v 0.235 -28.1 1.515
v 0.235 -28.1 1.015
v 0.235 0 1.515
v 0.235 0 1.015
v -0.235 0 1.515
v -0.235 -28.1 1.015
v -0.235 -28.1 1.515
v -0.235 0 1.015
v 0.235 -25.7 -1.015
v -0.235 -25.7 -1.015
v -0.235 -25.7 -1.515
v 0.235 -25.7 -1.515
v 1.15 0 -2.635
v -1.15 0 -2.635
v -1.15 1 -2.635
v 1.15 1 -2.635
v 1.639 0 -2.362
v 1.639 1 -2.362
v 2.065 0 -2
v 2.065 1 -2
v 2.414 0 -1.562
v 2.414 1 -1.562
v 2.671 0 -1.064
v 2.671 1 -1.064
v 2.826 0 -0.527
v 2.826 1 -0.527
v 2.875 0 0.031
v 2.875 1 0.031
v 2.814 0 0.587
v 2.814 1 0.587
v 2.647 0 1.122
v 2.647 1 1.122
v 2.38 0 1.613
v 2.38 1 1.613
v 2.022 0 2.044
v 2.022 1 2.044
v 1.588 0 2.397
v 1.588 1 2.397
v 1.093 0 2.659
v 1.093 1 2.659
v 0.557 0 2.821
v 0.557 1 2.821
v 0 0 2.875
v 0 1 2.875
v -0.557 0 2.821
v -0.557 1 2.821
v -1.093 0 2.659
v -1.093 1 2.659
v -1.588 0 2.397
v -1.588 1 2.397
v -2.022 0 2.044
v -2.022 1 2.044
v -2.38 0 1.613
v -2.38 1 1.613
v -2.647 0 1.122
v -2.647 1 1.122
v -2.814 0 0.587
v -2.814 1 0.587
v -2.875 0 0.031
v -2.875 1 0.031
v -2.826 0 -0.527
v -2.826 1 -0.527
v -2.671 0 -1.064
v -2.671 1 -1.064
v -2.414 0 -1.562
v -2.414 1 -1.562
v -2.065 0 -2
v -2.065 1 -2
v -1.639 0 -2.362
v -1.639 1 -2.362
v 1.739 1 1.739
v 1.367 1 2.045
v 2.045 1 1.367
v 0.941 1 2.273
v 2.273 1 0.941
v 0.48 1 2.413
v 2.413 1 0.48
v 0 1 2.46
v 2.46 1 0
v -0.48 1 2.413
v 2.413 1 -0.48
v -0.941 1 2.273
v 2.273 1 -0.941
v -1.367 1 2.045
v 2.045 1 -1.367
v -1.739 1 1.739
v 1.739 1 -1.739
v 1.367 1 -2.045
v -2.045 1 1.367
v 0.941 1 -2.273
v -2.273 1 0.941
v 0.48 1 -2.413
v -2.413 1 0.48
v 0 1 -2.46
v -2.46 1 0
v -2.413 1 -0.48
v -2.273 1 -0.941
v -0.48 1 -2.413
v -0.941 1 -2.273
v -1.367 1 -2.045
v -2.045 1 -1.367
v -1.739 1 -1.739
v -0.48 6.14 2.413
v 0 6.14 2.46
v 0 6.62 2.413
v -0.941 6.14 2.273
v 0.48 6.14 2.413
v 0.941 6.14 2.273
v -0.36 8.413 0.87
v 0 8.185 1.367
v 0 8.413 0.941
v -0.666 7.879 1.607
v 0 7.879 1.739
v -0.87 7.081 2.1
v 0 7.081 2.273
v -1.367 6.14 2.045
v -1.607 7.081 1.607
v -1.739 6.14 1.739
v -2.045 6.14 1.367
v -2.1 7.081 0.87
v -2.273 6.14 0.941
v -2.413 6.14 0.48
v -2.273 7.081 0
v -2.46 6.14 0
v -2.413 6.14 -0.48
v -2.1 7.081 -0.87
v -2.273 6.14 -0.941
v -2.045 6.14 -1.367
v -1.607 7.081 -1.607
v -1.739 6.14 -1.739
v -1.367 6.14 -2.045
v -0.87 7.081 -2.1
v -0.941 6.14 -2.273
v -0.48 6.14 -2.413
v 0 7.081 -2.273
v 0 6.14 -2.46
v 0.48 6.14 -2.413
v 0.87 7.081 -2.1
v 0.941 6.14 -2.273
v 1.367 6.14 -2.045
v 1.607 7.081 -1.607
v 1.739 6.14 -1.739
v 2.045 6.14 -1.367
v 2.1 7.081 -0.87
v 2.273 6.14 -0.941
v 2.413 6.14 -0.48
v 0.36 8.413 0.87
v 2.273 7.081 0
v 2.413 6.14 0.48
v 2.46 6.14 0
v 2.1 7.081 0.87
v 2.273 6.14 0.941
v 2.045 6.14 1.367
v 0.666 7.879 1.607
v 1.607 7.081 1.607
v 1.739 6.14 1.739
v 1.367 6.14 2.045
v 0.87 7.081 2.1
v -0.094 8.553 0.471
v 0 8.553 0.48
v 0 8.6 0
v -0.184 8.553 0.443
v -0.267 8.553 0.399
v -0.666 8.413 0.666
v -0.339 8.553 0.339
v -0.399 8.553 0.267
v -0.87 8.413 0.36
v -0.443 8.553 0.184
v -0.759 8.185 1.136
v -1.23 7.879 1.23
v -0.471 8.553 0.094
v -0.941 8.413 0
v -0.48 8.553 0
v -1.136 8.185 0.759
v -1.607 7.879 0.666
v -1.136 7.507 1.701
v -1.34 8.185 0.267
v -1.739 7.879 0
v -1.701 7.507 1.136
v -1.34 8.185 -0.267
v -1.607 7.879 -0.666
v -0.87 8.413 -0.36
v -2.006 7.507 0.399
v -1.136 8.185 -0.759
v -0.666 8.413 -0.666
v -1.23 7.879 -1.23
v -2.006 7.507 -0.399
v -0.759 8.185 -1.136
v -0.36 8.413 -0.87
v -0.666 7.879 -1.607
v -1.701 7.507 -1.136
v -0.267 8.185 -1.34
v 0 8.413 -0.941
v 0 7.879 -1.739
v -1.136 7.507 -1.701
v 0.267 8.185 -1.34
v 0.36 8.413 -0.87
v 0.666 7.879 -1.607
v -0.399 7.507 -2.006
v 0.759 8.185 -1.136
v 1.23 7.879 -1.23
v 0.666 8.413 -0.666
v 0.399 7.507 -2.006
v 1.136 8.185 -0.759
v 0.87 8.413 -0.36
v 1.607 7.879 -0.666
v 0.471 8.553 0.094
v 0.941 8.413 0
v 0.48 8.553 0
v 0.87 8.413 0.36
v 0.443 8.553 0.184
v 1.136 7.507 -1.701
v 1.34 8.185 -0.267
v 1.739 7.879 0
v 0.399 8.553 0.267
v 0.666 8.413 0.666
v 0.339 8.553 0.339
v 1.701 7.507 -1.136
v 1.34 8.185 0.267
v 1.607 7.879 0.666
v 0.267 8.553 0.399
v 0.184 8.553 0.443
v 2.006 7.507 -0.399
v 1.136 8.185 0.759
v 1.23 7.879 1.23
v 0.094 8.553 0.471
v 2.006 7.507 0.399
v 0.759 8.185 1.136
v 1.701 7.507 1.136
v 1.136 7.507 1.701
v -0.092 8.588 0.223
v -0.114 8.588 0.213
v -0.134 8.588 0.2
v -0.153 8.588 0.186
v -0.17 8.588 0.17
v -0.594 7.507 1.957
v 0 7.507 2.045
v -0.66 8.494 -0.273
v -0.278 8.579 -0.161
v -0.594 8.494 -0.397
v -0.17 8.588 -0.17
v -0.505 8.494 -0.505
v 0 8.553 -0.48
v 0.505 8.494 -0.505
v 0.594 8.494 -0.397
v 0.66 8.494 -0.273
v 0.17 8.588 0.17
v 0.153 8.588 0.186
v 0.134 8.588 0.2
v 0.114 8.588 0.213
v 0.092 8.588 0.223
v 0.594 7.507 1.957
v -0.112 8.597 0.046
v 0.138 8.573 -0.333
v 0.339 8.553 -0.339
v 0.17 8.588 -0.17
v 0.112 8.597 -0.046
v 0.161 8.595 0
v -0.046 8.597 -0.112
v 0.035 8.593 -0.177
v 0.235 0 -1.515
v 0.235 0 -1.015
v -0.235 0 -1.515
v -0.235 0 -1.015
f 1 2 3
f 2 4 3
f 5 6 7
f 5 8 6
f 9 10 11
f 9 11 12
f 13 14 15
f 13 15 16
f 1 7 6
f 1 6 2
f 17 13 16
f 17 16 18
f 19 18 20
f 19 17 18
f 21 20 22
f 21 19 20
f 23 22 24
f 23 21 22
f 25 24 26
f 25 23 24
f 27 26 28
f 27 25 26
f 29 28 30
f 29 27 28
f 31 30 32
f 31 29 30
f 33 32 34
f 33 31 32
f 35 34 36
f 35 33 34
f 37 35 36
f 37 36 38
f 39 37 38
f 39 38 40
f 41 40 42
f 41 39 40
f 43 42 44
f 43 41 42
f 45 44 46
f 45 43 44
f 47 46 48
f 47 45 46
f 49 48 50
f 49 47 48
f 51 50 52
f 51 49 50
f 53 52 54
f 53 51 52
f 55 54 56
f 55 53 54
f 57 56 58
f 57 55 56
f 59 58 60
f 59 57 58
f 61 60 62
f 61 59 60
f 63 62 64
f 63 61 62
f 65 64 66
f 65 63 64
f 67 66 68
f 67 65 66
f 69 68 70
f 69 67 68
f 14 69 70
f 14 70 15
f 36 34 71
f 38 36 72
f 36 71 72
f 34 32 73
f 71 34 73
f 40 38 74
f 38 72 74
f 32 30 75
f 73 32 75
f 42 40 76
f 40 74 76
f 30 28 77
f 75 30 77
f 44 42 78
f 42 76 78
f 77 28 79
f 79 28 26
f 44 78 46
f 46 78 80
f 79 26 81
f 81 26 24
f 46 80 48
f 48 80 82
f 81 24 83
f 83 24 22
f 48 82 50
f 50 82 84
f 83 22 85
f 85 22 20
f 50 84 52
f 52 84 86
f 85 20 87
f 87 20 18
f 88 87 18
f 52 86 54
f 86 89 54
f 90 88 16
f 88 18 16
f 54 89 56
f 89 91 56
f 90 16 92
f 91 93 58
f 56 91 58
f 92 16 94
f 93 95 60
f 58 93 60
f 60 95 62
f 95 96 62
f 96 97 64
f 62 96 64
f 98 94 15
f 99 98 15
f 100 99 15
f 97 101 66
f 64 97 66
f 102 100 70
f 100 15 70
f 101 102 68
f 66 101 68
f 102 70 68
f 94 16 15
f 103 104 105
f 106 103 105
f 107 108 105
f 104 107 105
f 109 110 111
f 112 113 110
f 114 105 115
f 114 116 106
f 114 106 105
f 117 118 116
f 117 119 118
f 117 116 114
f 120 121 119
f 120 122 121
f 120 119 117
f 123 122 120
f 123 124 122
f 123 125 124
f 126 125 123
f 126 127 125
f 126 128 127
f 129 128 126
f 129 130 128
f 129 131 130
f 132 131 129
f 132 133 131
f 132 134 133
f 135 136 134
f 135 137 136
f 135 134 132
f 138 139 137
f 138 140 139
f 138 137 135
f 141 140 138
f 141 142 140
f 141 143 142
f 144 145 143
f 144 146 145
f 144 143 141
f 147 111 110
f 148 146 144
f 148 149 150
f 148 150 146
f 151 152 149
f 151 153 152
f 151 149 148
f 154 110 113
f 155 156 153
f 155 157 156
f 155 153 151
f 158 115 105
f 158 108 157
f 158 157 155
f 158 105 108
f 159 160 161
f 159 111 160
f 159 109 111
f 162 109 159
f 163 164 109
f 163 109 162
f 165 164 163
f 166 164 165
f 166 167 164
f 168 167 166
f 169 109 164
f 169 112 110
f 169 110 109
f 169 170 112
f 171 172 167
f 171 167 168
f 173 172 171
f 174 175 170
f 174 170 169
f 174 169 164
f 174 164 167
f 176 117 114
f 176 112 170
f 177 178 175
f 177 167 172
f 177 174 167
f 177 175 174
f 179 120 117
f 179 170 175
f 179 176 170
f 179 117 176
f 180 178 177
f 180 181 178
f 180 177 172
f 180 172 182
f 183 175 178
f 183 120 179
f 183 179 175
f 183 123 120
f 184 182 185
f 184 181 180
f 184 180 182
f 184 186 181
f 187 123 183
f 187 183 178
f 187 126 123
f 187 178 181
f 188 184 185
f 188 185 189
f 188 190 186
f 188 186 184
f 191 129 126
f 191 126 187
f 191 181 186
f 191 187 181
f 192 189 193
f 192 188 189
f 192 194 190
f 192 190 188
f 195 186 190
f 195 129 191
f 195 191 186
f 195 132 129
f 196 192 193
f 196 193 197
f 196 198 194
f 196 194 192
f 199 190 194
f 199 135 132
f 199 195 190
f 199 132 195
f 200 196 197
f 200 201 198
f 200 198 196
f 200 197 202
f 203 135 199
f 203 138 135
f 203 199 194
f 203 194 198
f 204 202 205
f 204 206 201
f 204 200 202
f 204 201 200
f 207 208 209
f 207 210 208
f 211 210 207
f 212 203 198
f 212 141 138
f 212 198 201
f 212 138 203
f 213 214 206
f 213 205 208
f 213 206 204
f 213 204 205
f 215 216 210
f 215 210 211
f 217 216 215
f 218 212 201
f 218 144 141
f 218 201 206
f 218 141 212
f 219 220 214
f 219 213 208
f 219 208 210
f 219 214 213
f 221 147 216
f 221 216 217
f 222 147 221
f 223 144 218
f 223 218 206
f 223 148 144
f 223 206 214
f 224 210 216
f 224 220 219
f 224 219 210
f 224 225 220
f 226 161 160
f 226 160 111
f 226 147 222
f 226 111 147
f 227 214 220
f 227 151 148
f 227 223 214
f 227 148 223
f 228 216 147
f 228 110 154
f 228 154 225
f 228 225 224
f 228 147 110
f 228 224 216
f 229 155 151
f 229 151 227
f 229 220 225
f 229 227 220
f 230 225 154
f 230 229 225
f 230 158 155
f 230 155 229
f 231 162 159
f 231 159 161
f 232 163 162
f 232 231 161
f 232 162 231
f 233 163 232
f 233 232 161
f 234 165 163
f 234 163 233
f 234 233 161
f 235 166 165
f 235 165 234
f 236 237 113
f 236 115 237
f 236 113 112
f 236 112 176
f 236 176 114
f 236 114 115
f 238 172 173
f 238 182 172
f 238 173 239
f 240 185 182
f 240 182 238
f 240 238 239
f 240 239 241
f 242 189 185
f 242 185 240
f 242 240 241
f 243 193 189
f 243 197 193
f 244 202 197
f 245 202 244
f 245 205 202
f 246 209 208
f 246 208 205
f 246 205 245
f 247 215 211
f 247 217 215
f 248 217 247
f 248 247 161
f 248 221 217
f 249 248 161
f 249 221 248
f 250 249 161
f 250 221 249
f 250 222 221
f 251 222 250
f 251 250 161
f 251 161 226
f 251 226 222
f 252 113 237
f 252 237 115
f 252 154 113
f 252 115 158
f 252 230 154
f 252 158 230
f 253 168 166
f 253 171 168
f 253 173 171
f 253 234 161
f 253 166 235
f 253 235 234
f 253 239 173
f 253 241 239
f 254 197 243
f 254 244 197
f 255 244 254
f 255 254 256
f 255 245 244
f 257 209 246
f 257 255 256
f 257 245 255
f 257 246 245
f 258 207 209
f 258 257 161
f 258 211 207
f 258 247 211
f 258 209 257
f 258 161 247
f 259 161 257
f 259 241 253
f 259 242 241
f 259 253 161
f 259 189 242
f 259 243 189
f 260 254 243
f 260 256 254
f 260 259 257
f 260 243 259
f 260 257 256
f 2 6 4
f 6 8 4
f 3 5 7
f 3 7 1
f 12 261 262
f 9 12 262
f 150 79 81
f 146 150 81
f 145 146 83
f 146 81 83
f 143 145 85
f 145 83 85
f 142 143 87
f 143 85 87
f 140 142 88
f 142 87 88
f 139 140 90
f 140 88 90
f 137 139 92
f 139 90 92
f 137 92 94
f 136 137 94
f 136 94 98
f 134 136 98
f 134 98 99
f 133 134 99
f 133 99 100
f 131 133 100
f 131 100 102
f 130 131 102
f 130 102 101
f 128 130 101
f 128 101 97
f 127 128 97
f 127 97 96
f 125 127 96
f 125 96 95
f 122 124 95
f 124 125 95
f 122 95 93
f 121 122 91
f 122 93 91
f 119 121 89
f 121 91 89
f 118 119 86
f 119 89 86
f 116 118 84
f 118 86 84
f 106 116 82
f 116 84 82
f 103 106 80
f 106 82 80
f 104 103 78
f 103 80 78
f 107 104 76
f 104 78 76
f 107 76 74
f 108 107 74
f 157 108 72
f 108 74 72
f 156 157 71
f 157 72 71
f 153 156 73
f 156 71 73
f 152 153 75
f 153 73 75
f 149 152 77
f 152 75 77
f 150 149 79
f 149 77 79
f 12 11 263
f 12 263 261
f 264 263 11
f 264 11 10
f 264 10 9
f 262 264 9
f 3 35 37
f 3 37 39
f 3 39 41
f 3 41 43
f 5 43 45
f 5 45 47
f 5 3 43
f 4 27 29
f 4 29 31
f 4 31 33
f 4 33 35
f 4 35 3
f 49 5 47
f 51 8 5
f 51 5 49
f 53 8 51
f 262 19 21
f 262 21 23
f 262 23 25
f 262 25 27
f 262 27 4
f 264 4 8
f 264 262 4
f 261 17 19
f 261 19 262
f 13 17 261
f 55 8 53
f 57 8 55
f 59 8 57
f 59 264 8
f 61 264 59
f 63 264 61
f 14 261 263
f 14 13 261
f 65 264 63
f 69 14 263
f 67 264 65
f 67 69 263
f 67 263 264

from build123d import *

# Parameters (mm, degrees)
EXTRUDE_1_DEPTH = 1
SKETCH_2_R      = 2.46
EXTRUDE_2_DEPTH = 7.6
SKETCH_4_W      = 0.47
SKETCH_4_H      = 0.5
EXTRUDE_3_DEPTH = 25.7
SKETCH_5_W      = 0.47
SKETCH_5_H      = 0.5
EXTRUDE_4_DEPTH = 2.4


with BuildPart() as part:
    # 草图1 → 凸台-拉伸1 (new body)
    with BuildSketch(Plane(origin=(0, 0, 0), x_dir=(1, 0, 0), z_dir=(0, 1, 0))):
        with BuildLine():
            Line((-1.149957, 2.635), (1.149957, 2.635))
            ThreePointArc((1.149957, 2.635), (0, -2.875), (-1.149957, 2.635))
        make_face()
    extrude(amount=EXTRUDE_1_DEPTH)

    # 草图2 → 凸台-拉伸2 (add)
    with BuildSketch(Plane(origin=(0, 1, 0), x_dir=(1, 0, 0), z_dir=(0, 1, 0))):
        Circle(SKETCH_2_R)
    extrude(amount=EXTRUDE_2_DEPTH)

    # 草图3 → 切除-旋转1 (revolve, cut)
    with BuildSketch(Plane(origin=(0, 0, 0), x_dir=(0, 0, -1), z_dir=(1, 0, 0))):
        with BuildLine():
            Line((-2.46, 6.14), (-4.608425, 6.14))
            Line((-4.608425, 6.14), (-4.608425, 10.205518))
            Line((-4.608425, 10.205518), (0, 10.205518))
            Line((0, 10.205518), (0, 8.6))
            ThreePointArc((0, 8.6), (-1.739483, 7.879483), (-2.46, 6.14))
        make_face()
    revolve(axis=Axis((0, 10.969013, 0), (0, -1, 0)), mode=Mode.SUBTRACT)

    # 草图4 → 凸台-拉伸3 (add)
    with BuildSketch(Plane.XZ):
        with Locations((0, -1.265)):
            Rectangle(SKETCH_4_W, SKETCH_4_H)
        with Locations((0, 1.265)):
            Rectangle(SKETCH_4_W, SKETCH_4_H)
    extrude(amount=EXTRUDE_3_DEPTH)

    # 草图5 → 凸台-拉伸4 (add)
    with BuildSketch(Plane.XZ.offset(25.7)):
        with Locations((0, 1.265)):
            Rectangle(SKETCH_5_W, SKETCH_5_H)
    extrude(amount=EXTRUDE_4_DEPTH)


solid = part.part
